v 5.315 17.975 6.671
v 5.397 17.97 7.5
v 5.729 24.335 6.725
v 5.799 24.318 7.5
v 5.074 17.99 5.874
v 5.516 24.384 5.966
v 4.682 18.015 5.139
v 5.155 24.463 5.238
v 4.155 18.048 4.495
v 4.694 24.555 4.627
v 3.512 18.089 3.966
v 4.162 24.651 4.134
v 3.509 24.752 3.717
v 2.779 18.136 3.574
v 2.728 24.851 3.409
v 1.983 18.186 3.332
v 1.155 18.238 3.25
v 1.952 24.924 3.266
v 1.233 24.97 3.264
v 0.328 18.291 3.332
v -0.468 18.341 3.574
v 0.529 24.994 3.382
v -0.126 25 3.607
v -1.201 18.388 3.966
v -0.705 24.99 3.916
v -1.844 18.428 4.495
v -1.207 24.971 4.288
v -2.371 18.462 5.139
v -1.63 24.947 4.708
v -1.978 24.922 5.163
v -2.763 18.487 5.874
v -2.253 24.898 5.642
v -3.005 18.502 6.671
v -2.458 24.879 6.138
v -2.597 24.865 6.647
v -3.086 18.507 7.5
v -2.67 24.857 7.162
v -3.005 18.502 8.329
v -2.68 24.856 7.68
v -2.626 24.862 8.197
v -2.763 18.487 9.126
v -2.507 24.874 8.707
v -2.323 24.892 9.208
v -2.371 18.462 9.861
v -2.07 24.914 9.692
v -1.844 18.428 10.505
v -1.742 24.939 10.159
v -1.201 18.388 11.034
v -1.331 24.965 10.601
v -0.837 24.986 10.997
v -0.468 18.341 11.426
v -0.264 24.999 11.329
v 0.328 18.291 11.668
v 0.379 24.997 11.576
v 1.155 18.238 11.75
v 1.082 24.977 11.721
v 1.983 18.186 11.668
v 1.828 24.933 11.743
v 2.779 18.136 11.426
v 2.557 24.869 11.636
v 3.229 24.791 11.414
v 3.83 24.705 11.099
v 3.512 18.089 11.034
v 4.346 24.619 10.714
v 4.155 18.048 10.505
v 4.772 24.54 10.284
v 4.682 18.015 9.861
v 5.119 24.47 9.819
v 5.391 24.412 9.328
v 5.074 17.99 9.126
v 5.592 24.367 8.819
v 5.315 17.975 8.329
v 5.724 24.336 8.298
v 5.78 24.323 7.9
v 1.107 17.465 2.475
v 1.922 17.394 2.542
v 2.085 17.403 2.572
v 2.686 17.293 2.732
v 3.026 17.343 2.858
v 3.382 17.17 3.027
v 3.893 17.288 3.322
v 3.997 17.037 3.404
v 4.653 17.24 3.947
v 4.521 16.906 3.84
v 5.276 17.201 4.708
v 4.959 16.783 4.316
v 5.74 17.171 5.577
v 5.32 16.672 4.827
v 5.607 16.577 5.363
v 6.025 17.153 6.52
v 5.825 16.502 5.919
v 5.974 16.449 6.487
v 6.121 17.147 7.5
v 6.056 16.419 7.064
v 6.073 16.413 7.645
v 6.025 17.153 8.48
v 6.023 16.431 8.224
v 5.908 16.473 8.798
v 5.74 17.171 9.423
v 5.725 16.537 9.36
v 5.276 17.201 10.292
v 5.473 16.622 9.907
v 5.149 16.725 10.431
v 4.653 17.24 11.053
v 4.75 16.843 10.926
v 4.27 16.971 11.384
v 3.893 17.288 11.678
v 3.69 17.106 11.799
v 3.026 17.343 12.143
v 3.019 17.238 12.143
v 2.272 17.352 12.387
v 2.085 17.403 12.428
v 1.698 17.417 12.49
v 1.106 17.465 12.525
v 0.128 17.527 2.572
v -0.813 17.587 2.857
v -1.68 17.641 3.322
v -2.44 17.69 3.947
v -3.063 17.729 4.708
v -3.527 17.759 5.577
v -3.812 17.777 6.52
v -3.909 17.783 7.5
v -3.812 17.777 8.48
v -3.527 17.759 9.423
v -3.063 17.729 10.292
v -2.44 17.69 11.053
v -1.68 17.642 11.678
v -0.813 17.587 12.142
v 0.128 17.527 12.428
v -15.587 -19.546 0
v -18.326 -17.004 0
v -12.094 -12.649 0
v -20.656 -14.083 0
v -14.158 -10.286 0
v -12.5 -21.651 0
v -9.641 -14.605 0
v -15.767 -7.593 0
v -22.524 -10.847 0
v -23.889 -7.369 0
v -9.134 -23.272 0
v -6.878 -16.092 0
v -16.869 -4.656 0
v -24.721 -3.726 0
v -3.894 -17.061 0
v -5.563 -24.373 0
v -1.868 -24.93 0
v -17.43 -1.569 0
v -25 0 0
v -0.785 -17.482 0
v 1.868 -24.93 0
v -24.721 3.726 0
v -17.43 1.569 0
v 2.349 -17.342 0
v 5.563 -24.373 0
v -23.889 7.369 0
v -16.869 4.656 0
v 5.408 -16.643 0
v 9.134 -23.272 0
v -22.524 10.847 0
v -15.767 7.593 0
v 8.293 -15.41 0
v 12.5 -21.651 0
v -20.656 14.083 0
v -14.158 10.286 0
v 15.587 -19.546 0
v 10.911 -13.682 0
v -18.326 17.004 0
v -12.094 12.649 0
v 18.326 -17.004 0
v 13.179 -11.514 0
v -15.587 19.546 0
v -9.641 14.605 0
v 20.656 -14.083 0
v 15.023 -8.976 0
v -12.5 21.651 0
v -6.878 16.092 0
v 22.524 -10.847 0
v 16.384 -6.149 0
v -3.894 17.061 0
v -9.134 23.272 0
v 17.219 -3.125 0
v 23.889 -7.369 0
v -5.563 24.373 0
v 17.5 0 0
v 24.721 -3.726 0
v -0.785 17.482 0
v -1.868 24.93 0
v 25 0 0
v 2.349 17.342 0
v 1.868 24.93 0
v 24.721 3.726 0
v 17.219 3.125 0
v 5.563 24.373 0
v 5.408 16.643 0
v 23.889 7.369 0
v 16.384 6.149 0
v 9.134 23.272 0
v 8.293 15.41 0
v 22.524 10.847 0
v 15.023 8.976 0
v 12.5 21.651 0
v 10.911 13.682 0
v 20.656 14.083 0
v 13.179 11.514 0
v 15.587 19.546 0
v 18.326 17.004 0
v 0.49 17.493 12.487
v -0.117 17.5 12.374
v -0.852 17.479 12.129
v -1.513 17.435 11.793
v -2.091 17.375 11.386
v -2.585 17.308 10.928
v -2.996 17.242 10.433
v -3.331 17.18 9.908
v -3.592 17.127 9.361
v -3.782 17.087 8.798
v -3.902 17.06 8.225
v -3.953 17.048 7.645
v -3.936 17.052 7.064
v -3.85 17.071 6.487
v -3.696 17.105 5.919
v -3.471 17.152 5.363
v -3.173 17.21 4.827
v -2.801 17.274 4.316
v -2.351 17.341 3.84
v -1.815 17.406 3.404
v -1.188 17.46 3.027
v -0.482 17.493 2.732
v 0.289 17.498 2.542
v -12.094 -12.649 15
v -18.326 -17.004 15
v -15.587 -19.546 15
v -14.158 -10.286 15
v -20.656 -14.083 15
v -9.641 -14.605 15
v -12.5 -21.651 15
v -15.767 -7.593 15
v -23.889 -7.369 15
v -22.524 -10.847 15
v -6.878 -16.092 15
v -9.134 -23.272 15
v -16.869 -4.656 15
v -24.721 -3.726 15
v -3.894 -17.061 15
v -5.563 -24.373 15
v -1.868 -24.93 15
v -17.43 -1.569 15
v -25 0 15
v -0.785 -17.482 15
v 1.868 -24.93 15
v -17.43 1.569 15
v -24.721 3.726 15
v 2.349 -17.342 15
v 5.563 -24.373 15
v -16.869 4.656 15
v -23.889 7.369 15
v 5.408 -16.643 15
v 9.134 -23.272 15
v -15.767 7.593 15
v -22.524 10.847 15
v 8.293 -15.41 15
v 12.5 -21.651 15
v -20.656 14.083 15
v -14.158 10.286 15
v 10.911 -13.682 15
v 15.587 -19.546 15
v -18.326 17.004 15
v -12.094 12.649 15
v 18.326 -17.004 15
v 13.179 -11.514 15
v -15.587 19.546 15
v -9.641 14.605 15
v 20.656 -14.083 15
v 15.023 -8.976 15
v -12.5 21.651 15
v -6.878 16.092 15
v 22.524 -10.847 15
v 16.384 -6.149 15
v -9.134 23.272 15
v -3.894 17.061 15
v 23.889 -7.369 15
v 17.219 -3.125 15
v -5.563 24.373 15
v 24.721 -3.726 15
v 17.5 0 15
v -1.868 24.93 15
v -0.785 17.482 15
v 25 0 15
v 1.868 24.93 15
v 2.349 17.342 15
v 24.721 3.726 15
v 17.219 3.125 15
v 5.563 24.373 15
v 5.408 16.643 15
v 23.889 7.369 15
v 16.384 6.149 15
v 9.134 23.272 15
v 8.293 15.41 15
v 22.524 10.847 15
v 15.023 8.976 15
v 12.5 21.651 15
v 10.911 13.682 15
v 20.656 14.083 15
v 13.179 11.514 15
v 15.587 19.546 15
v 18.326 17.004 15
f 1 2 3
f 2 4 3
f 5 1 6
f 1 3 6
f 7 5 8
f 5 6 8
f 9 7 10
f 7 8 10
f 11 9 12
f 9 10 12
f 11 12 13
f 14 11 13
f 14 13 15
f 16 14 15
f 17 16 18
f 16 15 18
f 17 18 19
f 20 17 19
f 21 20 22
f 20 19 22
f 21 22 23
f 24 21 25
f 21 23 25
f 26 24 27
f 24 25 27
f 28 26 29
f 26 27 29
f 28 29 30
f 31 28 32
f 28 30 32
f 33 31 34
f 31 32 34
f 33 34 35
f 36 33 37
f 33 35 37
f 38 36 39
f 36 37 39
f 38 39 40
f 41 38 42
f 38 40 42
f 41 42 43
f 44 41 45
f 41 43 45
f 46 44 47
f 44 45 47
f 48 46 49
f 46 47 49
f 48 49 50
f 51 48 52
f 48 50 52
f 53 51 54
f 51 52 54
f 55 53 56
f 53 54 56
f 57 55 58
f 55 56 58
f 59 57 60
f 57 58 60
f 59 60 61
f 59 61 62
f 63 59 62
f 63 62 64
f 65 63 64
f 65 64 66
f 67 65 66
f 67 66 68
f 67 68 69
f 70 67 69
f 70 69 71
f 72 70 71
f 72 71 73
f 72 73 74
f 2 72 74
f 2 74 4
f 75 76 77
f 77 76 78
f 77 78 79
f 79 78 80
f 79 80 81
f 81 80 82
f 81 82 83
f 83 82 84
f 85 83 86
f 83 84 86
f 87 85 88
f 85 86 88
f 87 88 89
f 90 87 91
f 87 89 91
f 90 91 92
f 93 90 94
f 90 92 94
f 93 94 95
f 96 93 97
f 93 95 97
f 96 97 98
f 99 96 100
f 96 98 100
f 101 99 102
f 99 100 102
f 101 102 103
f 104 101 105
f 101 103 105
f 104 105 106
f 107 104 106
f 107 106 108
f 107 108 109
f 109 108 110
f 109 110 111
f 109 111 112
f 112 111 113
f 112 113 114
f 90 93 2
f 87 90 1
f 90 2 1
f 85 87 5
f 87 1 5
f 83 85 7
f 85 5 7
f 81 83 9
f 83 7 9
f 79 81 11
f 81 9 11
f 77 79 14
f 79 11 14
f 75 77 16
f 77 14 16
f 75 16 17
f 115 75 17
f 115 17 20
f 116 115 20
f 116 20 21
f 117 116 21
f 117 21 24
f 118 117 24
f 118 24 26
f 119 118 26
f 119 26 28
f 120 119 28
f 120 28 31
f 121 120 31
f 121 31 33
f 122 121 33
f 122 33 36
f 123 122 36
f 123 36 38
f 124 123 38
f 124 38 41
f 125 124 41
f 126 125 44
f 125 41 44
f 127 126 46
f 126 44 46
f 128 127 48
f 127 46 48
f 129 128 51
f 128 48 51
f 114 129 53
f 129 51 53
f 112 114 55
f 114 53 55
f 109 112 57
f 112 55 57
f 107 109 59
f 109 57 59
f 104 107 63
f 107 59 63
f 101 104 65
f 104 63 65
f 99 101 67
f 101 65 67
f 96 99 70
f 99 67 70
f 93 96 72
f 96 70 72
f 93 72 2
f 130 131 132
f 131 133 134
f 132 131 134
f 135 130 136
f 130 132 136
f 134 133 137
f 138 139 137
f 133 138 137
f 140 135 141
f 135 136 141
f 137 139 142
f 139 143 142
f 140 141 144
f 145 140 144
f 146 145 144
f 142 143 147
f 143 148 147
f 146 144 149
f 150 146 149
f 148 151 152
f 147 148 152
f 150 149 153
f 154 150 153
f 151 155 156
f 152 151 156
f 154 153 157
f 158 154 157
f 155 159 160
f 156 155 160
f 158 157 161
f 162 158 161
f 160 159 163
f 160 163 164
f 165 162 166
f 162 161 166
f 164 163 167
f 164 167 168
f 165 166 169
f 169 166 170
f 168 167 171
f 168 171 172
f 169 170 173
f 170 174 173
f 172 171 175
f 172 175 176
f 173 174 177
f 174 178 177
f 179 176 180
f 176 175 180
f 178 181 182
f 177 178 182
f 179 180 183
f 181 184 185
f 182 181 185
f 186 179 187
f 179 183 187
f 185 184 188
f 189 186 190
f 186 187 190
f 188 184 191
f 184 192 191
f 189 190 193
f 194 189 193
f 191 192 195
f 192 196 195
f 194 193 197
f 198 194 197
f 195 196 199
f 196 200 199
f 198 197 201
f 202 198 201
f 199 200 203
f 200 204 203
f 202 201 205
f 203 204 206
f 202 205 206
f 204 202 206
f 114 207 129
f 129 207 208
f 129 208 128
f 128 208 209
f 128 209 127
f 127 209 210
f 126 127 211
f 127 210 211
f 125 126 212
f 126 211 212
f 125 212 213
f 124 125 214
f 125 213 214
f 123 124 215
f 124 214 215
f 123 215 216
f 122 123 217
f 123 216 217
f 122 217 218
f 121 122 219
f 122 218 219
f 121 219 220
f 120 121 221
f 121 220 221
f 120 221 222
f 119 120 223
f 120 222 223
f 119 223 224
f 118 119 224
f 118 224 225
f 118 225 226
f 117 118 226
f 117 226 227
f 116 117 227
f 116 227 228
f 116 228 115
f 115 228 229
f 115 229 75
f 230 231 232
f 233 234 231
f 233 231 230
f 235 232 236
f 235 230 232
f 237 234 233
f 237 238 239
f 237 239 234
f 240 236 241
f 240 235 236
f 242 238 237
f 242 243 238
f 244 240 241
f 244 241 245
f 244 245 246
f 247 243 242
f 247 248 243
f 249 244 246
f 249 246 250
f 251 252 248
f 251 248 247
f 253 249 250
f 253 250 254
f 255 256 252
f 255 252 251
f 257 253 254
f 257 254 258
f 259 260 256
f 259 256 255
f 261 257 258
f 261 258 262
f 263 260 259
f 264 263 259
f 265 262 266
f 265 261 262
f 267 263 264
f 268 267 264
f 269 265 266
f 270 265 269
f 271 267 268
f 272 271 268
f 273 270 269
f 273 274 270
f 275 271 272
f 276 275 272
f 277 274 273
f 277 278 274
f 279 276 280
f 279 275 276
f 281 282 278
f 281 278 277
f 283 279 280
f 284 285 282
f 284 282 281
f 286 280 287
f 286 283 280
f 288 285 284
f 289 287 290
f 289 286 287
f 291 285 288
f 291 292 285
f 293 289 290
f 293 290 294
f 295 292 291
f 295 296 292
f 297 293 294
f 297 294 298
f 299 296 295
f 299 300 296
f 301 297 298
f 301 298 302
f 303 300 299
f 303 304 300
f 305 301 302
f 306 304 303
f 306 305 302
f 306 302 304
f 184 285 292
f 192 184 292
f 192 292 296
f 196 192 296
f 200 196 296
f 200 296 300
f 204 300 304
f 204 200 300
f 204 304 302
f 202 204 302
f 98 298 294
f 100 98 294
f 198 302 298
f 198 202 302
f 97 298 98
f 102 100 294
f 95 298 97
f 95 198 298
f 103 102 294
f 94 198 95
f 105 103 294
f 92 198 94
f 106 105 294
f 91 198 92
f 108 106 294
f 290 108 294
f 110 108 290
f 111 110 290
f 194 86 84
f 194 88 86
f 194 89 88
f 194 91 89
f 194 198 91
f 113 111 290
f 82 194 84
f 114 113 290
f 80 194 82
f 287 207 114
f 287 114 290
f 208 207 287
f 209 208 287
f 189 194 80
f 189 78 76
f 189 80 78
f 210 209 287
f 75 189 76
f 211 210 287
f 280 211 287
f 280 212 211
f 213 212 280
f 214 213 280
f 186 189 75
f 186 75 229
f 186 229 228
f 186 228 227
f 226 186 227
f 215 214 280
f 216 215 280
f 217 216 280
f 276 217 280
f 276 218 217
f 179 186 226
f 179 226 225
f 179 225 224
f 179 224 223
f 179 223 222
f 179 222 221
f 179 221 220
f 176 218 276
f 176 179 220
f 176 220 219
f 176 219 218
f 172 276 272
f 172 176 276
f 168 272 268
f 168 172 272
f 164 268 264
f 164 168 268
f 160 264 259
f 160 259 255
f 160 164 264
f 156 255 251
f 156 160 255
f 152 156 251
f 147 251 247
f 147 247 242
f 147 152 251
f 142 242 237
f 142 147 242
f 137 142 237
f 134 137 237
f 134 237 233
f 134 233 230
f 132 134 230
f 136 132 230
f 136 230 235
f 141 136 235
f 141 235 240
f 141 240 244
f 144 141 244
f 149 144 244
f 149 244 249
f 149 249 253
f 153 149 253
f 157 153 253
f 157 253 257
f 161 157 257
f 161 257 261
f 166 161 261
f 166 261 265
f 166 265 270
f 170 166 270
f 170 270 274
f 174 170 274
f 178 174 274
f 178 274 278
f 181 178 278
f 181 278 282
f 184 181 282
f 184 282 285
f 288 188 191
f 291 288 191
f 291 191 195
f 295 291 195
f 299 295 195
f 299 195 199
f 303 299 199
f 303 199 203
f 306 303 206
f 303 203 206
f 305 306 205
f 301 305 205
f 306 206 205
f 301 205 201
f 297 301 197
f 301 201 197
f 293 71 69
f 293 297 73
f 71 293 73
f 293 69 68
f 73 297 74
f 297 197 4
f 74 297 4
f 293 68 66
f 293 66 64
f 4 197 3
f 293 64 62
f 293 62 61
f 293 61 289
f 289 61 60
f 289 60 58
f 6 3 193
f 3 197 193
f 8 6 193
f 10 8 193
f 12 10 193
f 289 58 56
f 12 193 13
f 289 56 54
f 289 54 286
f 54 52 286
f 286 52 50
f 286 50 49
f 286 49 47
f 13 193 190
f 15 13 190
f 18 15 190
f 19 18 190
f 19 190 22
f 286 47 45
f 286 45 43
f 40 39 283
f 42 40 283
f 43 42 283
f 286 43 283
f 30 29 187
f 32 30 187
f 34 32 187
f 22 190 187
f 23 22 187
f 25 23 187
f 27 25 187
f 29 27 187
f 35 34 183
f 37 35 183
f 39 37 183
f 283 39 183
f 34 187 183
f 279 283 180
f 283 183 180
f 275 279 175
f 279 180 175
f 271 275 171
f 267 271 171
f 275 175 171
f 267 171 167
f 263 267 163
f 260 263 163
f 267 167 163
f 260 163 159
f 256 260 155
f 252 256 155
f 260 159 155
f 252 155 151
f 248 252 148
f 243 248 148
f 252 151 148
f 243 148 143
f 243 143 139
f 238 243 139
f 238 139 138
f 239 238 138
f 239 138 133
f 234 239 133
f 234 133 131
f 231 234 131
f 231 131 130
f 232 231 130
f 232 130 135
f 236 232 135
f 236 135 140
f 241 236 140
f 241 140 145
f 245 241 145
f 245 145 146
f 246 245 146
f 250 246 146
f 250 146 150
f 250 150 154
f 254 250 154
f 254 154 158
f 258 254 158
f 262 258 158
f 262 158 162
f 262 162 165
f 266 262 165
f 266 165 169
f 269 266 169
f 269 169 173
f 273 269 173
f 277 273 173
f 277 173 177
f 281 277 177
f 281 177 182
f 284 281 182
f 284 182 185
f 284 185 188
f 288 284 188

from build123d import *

# Parameters (mm, degrees)
SKETCH_1_R                   = 25
SKETCH_1_R_2                 = 17.5
EXTRUDE_1_DEPTH              = 15
HOLE_WIZARD_M102_D           = 8.5
HOLE_WIZARD_M102_DEPTH       = 24.946342369
HOLE_WIZARD_M102_CSINK_D     = 10.05
HOLE_WIZARD_M102_CSINK_ANGLE = 90
HOLE_WIZARD_M102_TIP         = 2.553657631


with BuildPart() as part:
    # Эскиз1 → Бобышка-Вытянуть1 (new body)
    with BuildSketch(Plane.XY):
        Circle(SKETCH_1_R)
        Circle(SKETCH_1_R_2, mode=Mode.SUBTRACT)
    extrude(amount=EXTRUDE_1_DEPTH)

    # Отверстие обработанное метчиком M102
    with Locations(Plane(origin=(1.106433423, 17.464987978, 7.5), x_dir=(-0.997999313042, 0.063224767047, 0), z_dir=(-0.063224767047, -0.997999313042, 0))):
        with Locations((0, 0)):
            CounterSinkHole(HOLE_WIZARD_M102_D / 2, HOLE_WIZARD_M102_CSINK_D / 2, depth=HOLE_WIZARD_M102_DEPTH, counter_sink_angle=HOLE_WIZARD_M102_CSINK_ANGLE)
            with Locations((0, 0, -(HOLE_WIZARD_M102_DEPTH + HOLE_WIZARD_M102_TIP / 2))):  # 118° drill point
                Cone(0, HOLE_WIZARD_M102_D / 2, HOLE_WIZARD_M102_TIP, mode=Mode.SUBTRACT)


solid = part.part
